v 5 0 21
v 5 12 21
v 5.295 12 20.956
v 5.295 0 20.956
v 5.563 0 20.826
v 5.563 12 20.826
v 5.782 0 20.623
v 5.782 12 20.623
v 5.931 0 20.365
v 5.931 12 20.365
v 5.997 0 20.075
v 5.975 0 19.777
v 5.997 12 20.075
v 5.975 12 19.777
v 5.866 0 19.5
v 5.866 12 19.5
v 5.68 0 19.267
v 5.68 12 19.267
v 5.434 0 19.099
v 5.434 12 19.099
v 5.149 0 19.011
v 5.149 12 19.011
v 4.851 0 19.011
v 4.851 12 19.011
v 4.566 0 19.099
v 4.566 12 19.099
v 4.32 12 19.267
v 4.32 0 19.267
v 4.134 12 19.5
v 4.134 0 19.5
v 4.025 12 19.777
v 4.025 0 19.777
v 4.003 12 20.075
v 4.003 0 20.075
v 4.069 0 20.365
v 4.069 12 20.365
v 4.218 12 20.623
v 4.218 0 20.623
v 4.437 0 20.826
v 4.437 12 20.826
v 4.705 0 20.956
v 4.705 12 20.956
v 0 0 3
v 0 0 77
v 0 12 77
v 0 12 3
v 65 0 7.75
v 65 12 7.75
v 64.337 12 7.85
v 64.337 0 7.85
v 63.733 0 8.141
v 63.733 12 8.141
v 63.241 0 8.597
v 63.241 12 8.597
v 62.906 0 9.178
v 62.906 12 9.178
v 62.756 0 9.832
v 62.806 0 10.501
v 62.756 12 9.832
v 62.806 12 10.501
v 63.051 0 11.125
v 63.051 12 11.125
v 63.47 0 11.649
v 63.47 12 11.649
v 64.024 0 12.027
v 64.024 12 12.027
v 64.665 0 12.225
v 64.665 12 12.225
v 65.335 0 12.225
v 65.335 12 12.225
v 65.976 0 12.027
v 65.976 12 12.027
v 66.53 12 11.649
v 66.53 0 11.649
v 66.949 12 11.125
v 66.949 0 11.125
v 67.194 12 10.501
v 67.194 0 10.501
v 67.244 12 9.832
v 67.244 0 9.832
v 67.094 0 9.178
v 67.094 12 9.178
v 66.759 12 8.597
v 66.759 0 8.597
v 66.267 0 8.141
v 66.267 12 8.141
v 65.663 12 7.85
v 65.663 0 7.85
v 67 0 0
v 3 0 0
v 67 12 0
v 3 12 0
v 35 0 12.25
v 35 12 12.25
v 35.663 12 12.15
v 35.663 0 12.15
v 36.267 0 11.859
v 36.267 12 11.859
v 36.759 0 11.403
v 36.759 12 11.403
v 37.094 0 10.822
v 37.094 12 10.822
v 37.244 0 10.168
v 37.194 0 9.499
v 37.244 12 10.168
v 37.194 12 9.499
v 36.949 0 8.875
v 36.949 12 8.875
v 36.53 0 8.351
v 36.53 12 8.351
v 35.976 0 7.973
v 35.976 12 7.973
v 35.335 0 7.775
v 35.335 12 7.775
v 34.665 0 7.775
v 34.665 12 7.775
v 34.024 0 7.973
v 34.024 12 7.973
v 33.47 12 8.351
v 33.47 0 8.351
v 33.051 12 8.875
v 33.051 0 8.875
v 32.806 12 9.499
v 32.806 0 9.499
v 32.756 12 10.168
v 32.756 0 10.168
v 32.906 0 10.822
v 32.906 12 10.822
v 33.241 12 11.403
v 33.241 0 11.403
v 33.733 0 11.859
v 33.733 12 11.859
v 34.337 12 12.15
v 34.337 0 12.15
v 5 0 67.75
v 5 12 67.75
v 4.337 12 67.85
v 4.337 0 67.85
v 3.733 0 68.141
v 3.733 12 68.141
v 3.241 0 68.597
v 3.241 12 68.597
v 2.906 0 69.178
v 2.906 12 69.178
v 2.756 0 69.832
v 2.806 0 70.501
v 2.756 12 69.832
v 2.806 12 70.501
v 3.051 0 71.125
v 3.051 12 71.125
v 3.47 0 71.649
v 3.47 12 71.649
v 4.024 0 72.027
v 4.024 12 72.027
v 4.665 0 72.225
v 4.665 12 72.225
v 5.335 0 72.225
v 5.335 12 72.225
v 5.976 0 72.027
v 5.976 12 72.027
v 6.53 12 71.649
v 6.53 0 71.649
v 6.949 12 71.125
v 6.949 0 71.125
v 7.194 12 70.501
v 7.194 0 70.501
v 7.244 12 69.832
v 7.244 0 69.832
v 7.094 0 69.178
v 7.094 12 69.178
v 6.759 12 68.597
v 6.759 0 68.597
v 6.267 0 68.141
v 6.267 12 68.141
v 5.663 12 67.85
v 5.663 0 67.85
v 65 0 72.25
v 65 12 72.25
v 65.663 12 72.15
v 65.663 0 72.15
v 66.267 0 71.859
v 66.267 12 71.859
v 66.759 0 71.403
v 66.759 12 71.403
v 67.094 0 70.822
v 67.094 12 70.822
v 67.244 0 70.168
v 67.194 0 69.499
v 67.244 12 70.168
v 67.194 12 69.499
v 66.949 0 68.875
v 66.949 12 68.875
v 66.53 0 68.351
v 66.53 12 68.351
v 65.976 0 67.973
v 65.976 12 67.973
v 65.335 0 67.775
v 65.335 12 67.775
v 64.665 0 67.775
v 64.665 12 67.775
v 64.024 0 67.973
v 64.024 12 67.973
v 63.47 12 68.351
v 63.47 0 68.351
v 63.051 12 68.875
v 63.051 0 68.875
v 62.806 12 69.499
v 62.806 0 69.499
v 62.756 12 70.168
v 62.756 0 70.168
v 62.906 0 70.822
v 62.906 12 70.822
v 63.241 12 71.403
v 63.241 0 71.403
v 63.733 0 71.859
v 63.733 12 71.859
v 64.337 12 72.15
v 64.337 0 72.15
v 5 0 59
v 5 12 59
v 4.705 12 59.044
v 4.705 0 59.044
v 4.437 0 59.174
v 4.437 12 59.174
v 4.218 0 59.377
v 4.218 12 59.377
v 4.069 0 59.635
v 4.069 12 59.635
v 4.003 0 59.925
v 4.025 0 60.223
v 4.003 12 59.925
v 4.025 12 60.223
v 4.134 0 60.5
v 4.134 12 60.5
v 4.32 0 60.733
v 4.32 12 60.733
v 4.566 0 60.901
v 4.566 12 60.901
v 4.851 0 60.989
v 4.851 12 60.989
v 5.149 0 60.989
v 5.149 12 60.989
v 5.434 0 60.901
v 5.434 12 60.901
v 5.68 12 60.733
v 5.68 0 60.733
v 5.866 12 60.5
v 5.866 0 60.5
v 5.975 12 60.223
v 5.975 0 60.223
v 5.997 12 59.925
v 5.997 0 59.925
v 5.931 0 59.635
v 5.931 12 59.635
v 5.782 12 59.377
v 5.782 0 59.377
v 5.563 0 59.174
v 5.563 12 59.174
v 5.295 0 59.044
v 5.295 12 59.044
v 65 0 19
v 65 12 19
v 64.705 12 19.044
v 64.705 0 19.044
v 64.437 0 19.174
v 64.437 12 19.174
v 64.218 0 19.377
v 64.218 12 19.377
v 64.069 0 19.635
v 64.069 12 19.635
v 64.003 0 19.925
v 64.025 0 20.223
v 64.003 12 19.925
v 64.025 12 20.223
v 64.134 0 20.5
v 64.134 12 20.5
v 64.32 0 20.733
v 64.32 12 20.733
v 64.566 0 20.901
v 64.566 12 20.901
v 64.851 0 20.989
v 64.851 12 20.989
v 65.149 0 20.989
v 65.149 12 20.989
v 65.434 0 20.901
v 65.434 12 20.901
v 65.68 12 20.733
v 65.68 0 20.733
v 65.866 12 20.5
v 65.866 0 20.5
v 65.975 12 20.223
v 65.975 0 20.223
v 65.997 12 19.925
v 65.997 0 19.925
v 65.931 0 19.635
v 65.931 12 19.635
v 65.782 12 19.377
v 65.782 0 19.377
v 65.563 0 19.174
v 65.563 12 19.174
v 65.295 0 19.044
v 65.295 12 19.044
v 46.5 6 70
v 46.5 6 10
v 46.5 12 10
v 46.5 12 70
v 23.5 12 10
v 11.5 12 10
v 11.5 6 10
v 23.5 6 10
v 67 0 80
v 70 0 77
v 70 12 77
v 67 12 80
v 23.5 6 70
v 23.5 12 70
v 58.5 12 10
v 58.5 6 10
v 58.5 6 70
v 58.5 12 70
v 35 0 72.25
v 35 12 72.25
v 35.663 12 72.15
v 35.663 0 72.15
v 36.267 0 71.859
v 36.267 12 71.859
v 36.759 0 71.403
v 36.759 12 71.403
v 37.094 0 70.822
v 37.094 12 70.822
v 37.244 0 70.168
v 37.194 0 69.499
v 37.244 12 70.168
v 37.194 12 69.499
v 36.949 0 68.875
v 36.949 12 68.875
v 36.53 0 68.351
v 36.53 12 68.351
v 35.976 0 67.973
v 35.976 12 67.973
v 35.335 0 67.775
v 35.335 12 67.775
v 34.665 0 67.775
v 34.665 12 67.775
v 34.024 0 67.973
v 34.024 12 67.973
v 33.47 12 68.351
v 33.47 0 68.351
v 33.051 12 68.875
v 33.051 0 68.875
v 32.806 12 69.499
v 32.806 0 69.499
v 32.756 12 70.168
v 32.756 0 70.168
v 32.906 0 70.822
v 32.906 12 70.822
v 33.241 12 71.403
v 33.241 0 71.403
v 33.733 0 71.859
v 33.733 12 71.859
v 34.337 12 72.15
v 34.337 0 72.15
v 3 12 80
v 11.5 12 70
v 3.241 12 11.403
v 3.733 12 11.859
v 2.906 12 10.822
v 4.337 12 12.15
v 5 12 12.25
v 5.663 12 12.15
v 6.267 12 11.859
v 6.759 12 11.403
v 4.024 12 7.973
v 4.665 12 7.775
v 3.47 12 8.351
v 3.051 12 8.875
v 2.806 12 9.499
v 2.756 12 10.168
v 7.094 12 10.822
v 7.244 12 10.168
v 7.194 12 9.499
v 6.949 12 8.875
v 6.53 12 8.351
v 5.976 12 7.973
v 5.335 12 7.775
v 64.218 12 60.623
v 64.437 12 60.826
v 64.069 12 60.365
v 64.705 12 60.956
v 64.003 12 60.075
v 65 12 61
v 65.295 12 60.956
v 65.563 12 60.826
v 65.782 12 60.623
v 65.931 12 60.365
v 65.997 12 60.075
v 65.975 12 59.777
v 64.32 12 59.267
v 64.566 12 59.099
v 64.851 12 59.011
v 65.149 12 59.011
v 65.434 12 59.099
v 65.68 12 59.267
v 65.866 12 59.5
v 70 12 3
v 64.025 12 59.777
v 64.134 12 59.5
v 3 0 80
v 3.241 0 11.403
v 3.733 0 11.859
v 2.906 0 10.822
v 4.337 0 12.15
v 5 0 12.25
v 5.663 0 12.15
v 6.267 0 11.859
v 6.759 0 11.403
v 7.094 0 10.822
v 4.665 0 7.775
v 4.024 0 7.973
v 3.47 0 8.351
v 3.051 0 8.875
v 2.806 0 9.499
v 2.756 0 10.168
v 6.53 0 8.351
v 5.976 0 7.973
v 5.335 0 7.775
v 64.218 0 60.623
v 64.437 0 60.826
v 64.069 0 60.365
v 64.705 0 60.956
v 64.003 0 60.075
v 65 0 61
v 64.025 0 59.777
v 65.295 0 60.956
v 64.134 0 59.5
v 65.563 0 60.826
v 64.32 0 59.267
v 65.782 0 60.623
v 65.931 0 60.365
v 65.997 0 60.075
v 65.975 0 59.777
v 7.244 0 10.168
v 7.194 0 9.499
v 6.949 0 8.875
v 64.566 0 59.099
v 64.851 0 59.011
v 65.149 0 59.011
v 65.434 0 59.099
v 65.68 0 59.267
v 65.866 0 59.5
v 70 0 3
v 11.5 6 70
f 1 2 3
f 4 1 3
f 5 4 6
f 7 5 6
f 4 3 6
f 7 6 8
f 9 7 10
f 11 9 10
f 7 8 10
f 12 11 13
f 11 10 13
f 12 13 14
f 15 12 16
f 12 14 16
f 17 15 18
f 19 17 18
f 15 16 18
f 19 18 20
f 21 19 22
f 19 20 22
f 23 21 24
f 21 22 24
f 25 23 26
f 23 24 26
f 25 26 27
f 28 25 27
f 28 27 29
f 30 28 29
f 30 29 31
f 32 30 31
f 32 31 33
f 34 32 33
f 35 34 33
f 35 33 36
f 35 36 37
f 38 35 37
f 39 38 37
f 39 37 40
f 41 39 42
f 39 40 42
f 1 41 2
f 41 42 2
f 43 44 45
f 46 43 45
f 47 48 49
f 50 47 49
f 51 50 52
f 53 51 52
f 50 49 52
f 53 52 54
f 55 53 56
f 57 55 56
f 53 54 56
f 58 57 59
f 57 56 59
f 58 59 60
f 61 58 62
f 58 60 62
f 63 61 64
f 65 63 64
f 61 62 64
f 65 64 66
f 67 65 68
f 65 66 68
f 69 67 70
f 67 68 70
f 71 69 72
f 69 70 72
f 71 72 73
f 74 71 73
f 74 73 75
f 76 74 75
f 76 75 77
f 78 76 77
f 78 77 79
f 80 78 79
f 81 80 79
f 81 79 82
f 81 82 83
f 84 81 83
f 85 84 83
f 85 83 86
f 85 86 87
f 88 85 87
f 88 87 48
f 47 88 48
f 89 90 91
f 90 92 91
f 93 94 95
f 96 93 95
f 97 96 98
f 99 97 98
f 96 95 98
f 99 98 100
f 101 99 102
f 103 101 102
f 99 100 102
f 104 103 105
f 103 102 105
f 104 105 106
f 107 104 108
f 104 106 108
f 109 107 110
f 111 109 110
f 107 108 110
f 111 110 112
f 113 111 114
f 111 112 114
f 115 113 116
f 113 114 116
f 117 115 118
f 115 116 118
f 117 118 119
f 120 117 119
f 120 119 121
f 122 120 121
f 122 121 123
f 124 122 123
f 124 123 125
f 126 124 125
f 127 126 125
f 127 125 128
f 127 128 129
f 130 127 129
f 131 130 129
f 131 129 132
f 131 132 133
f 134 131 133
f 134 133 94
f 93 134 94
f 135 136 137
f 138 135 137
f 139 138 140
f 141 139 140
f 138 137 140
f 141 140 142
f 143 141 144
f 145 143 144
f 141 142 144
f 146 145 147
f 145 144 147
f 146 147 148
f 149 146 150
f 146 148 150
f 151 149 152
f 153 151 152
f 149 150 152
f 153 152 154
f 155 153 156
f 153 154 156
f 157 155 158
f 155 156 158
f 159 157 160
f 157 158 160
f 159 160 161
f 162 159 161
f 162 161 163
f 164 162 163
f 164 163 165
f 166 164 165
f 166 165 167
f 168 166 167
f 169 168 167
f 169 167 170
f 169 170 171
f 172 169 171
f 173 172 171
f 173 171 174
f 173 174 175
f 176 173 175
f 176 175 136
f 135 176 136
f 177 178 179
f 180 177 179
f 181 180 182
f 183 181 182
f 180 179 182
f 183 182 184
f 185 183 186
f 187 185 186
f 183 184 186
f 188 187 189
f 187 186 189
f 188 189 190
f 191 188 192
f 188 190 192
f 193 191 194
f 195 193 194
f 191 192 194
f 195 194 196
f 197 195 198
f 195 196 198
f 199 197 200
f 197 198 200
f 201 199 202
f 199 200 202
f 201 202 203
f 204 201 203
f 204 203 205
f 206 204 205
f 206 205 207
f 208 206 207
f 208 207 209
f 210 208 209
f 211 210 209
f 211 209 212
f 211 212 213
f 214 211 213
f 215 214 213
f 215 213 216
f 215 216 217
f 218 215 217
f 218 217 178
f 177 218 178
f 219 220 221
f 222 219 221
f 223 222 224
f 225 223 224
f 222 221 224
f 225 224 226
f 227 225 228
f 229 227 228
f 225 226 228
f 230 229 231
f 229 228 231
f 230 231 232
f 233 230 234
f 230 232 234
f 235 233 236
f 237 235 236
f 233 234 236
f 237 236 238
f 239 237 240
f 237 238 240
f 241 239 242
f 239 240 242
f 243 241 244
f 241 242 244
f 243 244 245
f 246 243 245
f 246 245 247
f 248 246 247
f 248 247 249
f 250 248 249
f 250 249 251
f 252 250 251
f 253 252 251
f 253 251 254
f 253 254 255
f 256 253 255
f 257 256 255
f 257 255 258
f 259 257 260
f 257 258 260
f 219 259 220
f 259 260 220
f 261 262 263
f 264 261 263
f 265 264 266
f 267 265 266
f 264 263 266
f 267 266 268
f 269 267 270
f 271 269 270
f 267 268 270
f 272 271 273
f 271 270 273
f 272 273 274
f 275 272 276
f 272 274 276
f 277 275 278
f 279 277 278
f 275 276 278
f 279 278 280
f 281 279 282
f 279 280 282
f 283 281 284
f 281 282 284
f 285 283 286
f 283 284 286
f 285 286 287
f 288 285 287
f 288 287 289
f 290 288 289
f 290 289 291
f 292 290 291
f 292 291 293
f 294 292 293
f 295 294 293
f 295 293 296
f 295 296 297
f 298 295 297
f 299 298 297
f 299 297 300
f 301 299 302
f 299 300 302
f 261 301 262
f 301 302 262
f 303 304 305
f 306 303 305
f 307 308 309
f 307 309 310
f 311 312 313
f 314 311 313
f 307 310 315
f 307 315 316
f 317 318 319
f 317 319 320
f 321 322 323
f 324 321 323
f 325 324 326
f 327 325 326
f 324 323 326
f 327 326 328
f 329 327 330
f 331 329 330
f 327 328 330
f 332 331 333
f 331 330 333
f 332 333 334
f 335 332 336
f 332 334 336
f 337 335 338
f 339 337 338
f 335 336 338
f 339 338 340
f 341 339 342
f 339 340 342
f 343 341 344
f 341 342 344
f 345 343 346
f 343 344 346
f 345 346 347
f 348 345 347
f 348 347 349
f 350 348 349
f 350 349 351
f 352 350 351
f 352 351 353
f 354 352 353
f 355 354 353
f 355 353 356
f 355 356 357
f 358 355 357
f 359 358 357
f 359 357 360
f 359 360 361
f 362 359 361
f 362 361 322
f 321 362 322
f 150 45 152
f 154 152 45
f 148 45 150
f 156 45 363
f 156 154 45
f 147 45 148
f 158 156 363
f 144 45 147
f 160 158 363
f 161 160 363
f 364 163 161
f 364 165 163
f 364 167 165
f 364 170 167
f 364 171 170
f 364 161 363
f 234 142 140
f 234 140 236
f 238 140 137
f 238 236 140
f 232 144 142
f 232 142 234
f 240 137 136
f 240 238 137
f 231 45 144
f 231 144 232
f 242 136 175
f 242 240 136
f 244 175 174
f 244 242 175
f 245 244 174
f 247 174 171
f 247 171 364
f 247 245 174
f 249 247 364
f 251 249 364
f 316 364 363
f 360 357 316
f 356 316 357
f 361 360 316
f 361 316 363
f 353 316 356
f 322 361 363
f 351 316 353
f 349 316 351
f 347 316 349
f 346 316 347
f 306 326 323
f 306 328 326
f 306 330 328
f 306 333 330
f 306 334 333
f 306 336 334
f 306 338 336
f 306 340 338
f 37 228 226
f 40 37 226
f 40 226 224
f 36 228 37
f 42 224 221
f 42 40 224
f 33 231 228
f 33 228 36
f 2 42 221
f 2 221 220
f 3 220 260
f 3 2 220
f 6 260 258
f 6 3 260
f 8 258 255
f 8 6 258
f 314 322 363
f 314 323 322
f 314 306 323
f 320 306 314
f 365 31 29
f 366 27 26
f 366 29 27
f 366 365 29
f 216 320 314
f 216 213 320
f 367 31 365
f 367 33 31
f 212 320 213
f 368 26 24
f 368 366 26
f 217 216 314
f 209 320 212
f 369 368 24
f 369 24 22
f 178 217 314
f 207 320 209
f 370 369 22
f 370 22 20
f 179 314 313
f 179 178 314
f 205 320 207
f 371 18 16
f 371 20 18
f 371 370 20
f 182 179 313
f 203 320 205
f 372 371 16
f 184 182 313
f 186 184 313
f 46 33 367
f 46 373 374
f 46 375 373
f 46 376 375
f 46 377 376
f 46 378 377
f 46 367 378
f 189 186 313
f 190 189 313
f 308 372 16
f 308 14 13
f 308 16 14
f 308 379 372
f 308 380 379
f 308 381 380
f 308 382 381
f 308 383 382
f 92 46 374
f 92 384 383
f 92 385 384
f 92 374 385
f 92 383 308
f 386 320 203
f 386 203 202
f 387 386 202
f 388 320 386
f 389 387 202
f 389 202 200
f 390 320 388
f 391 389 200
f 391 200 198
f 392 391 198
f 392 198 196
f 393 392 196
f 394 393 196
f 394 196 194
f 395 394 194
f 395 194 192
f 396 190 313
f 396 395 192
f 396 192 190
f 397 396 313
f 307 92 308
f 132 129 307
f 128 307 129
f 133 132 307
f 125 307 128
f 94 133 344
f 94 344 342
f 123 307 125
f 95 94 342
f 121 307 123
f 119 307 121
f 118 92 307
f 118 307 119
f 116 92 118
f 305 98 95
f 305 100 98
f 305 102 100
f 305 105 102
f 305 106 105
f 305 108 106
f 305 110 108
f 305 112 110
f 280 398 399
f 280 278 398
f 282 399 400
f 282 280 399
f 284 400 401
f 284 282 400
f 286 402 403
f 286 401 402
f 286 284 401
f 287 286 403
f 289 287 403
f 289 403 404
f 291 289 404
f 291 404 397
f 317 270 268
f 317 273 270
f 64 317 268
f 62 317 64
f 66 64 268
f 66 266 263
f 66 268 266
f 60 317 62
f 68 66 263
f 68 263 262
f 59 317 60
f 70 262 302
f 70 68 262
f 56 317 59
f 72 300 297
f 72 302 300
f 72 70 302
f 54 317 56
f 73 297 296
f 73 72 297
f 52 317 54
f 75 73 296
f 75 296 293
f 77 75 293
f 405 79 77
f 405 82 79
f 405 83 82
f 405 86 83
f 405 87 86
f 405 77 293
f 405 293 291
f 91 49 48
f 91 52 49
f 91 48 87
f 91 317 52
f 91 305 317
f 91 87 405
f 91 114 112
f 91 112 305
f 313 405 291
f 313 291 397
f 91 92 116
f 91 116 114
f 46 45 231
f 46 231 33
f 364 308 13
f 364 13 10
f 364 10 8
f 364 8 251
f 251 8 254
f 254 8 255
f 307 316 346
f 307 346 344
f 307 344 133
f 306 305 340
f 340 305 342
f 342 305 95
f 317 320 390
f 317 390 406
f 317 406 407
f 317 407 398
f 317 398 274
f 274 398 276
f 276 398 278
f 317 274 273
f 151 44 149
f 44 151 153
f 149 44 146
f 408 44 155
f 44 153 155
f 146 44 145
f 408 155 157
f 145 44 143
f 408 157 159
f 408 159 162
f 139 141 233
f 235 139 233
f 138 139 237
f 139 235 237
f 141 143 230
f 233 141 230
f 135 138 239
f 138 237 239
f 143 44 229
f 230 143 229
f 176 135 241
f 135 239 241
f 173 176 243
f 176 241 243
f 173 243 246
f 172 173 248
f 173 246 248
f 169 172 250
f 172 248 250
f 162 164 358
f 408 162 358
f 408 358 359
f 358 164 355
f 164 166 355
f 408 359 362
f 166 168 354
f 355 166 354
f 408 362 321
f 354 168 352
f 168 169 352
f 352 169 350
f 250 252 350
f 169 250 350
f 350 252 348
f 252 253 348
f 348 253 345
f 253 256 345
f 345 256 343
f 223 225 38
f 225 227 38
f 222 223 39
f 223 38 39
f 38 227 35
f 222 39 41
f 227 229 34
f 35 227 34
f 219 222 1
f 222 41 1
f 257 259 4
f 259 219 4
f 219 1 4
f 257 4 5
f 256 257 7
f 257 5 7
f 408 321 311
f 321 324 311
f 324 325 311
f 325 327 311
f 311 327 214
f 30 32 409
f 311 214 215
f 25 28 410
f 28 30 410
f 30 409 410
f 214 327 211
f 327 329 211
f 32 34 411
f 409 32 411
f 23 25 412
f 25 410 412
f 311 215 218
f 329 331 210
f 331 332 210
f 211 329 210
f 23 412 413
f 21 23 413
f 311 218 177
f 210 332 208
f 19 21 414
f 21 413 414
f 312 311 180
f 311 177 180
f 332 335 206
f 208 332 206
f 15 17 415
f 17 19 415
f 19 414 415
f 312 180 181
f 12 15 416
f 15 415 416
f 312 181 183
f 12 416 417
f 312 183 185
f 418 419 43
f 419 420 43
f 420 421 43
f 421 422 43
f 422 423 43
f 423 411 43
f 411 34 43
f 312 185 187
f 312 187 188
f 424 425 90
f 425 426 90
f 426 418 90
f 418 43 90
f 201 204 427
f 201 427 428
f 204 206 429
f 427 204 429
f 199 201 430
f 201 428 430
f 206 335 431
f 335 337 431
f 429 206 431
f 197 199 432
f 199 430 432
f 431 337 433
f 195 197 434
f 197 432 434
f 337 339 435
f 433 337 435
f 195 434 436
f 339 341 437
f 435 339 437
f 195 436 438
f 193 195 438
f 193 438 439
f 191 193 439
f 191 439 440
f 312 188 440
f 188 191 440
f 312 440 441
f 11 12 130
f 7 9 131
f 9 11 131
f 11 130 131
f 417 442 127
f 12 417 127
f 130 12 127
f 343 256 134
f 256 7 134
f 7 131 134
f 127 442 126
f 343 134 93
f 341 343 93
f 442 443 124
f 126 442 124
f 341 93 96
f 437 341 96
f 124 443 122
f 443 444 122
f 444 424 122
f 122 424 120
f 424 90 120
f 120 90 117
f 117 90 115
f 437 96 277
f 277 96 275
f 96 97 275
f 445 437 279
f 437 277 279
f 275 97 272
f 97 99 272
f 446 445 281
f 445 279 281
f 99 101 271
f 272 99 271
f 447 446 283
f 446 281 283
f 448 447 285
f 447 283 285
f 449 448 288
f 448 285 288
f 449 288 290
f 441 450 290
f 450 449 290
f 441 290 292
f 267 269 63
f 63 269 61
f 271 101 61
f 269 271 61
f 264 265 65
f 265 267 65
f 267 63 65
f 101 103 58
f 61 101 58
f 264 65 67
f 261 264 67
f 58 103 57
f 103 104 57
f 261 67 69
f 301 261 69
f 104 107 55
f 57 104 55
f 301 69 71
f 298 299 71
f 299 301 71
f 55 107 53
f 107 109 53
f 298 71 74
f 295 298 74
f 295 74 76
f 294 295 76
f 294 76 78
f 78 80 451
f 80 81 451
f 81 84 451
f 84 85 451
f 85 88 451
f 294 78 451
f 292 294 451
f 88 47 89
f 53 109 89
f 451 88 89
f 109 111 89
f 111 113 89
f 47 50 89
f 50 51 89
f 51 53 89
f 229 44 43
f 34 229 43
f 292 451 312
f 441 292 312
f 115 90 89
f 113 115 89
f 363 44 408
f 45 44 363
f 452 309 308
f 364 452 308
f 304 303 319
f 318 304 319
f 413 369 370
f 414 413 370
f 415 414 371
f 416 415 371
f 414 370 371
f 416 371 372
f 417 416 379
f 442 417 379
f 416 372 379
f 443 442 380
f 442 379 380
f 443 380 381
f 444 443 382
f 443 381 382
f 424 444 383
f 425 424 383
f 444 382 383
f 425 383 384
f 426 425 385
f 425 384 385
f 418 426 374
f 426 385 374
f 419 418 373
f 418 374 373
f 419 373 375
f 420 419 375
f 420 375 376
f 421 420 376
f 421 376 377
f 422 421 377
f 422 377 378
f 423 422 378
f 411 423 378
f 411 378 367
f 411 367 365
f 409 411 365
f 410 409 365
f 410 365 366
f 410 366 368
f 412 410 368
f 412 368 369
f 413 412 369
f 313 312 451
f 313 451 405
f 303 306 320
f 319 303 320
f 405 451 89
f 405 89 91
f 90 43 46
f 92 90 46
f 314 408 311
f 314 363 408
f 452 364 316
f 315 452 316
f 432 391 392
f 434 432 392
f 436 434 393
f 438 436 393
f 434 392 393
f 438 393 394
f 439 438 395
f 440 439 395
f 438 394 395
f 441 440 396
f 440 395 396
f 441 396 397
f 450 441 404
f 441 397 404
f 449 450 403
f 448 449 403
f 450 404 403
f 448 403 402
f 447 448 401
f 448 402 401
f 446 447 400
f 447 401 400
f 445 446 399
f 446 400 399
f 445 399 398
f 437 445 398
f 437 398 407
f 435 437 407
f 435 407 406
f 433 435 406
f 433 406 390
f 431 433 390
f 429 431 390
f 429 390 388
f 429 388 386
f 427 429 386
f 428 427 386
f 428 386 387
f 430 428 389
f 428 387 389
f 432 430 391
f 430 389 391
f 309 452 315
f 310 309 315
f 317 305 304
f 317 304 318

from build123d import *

# Parameters (mm, degrees)
ESQUISSE1_W             = 70
ESQUISSE1_H             = 12
BOSS_EXTRU_1_DEPTH      = 80
ESQUISSE2_W             = 12
ESQUISSE2_H             = 6
ENL_V_MAT_EXTRU_1_DEPTH = 107.976632963
ESQUISSE4_R             = 2.25
ENL_V_MAT_EXTRU_3_DEPTH = 107.976632963
ESQUISSE5_W             = 12
ESQUISSE5_H             = 10
BOSS_EXTRU_2_DEPTH      = 6
CHANFREIN1_SIZE         = 3
ESQUISSE6_R             = 1
ENL_V_MAT_EXTRU_4_DEPTH = 12


with BuildPart() as part:
    # Esquisse1 → Boss.-Extru.1 (new body)
    with BuildSketch(Plane.XY):
        with Locations((35, 6)):
            Rectangle(ESQUISSE1_W, ESQUISSE1_H)
    extrude(amount=BOSS_EXTRU_1_DEPTH)

    # Esquisse2 → Enlèv. mat.-Extru.1 (cut, through all)
    with BuildSketch(Plane.XY.offset(80)):
        with Locations((52.5, 9)):
            Rectangle(ESQUISSE2_W, ESQUISSE2_H)
        with Locations((17.5, 9)):
            Rectangle(ESQUISSE2_W, ESQUISSE2_H)
    extrude(amount=-ENL_V_MAT_EXTRU_1_DEPTH, mode=Mode.SUBTRACT)

    # Esquisse4 → Enlèv. mat.-Extru.3 (cut, through all)
    with BuildSketch(Plane(origin=(0, 12, 0), x_dir=(1, 0, 0), z_dir=(0, 1, 0))):
        with Locations(Location((5, -10, 0), (0, 0, 270))):
            Circle(ESQUISSE4_R)
        with Locations(Location((65, -70, 0), (0, 0, 270))):
            Circle(ESQUISSE4_R)
        with Locations(Location((65, -10, 0), (0, 0, 90))):
            Circle(ESQUISSE4_R)
        with Locations(Location((5, -70, 0), (0, 0, 90))):
            Circle(ESQUISSE4_R)
        with Locations(Location((35, -10, 0), (0, 0, 270))):
            Circle(ESQUISSE4_R)
        with Locations(Location((35, -70, 0), (0, 0, 270))):
            Circle(ESQUISSE4_R)
    extrude(amount=-ENL_V_MAT_EXTRU_3_DEPTH, mode=Mode.SUBTRACT)

    # Esquisse5 → Boss.-Extru.2 (add)
    with BuildSketch(Plane(origin=(0, 12, 0), x_dir=(1, 0, 0), z_dir=(0, 1, 0))):
        with Locations((17.5, -75)):
            Rectangle(ESQUISSE5_W, ESQUISSE5_H)
        with Locations((52.5, -75)):
            Rectangle(ESQUISSE5_W, ESQUISSE5_H)
        with Locations((52.5, -5)):
            Rectangle(ESQUISSE5_W, ESQUISSE5_H)
        with Locations((17.5, -5)):
            Rectangle(ESQUISSE5_W, ESQUISSE5_H)
    extrude(amount=-BOSS_EXTRU_2_DEPTH)

    # Chanfrein1
    chanfrein1_edges = [part.edges().sort_by_distance(p)[0] for p in [
        (70, 6, 80),
        (0, 6, 80),
        (70, 6, 0),
        (0, 6, 0),
    ]]
    chamfer(chanfrein1_edges, length=CHANFREIN1_SIZE)

    # Esquisse6 → Enlèv. mat.-Extru.4 (cut)
    with BuildSketch(Plane(origin=(0, 12, 0), x_dir=(1, 0, 0), z_dir=(0, 1, 0))):
        with Locations(Location((5, -20, 0), (0, 0, 270))):
            Circle(ESQUISSE6_R)
        with Locations(Location((5, -60, 0), (0, 0, 90))):
            Circle(ESQUISSE6_R)
        with Locations(Location((65, -60, 0), (0, 0, 270))):
            Circle(ESQUISSE6_R)
        with Locations(Location((65, -20, 0), (0, 0, 90))):
            Circle(ESQUISSE6_R)
    extrude(amount=-ENL_V_MAT_EXTRU_4_DEPTH, mode=Mode.SUBTRACT)


solid = part.part
